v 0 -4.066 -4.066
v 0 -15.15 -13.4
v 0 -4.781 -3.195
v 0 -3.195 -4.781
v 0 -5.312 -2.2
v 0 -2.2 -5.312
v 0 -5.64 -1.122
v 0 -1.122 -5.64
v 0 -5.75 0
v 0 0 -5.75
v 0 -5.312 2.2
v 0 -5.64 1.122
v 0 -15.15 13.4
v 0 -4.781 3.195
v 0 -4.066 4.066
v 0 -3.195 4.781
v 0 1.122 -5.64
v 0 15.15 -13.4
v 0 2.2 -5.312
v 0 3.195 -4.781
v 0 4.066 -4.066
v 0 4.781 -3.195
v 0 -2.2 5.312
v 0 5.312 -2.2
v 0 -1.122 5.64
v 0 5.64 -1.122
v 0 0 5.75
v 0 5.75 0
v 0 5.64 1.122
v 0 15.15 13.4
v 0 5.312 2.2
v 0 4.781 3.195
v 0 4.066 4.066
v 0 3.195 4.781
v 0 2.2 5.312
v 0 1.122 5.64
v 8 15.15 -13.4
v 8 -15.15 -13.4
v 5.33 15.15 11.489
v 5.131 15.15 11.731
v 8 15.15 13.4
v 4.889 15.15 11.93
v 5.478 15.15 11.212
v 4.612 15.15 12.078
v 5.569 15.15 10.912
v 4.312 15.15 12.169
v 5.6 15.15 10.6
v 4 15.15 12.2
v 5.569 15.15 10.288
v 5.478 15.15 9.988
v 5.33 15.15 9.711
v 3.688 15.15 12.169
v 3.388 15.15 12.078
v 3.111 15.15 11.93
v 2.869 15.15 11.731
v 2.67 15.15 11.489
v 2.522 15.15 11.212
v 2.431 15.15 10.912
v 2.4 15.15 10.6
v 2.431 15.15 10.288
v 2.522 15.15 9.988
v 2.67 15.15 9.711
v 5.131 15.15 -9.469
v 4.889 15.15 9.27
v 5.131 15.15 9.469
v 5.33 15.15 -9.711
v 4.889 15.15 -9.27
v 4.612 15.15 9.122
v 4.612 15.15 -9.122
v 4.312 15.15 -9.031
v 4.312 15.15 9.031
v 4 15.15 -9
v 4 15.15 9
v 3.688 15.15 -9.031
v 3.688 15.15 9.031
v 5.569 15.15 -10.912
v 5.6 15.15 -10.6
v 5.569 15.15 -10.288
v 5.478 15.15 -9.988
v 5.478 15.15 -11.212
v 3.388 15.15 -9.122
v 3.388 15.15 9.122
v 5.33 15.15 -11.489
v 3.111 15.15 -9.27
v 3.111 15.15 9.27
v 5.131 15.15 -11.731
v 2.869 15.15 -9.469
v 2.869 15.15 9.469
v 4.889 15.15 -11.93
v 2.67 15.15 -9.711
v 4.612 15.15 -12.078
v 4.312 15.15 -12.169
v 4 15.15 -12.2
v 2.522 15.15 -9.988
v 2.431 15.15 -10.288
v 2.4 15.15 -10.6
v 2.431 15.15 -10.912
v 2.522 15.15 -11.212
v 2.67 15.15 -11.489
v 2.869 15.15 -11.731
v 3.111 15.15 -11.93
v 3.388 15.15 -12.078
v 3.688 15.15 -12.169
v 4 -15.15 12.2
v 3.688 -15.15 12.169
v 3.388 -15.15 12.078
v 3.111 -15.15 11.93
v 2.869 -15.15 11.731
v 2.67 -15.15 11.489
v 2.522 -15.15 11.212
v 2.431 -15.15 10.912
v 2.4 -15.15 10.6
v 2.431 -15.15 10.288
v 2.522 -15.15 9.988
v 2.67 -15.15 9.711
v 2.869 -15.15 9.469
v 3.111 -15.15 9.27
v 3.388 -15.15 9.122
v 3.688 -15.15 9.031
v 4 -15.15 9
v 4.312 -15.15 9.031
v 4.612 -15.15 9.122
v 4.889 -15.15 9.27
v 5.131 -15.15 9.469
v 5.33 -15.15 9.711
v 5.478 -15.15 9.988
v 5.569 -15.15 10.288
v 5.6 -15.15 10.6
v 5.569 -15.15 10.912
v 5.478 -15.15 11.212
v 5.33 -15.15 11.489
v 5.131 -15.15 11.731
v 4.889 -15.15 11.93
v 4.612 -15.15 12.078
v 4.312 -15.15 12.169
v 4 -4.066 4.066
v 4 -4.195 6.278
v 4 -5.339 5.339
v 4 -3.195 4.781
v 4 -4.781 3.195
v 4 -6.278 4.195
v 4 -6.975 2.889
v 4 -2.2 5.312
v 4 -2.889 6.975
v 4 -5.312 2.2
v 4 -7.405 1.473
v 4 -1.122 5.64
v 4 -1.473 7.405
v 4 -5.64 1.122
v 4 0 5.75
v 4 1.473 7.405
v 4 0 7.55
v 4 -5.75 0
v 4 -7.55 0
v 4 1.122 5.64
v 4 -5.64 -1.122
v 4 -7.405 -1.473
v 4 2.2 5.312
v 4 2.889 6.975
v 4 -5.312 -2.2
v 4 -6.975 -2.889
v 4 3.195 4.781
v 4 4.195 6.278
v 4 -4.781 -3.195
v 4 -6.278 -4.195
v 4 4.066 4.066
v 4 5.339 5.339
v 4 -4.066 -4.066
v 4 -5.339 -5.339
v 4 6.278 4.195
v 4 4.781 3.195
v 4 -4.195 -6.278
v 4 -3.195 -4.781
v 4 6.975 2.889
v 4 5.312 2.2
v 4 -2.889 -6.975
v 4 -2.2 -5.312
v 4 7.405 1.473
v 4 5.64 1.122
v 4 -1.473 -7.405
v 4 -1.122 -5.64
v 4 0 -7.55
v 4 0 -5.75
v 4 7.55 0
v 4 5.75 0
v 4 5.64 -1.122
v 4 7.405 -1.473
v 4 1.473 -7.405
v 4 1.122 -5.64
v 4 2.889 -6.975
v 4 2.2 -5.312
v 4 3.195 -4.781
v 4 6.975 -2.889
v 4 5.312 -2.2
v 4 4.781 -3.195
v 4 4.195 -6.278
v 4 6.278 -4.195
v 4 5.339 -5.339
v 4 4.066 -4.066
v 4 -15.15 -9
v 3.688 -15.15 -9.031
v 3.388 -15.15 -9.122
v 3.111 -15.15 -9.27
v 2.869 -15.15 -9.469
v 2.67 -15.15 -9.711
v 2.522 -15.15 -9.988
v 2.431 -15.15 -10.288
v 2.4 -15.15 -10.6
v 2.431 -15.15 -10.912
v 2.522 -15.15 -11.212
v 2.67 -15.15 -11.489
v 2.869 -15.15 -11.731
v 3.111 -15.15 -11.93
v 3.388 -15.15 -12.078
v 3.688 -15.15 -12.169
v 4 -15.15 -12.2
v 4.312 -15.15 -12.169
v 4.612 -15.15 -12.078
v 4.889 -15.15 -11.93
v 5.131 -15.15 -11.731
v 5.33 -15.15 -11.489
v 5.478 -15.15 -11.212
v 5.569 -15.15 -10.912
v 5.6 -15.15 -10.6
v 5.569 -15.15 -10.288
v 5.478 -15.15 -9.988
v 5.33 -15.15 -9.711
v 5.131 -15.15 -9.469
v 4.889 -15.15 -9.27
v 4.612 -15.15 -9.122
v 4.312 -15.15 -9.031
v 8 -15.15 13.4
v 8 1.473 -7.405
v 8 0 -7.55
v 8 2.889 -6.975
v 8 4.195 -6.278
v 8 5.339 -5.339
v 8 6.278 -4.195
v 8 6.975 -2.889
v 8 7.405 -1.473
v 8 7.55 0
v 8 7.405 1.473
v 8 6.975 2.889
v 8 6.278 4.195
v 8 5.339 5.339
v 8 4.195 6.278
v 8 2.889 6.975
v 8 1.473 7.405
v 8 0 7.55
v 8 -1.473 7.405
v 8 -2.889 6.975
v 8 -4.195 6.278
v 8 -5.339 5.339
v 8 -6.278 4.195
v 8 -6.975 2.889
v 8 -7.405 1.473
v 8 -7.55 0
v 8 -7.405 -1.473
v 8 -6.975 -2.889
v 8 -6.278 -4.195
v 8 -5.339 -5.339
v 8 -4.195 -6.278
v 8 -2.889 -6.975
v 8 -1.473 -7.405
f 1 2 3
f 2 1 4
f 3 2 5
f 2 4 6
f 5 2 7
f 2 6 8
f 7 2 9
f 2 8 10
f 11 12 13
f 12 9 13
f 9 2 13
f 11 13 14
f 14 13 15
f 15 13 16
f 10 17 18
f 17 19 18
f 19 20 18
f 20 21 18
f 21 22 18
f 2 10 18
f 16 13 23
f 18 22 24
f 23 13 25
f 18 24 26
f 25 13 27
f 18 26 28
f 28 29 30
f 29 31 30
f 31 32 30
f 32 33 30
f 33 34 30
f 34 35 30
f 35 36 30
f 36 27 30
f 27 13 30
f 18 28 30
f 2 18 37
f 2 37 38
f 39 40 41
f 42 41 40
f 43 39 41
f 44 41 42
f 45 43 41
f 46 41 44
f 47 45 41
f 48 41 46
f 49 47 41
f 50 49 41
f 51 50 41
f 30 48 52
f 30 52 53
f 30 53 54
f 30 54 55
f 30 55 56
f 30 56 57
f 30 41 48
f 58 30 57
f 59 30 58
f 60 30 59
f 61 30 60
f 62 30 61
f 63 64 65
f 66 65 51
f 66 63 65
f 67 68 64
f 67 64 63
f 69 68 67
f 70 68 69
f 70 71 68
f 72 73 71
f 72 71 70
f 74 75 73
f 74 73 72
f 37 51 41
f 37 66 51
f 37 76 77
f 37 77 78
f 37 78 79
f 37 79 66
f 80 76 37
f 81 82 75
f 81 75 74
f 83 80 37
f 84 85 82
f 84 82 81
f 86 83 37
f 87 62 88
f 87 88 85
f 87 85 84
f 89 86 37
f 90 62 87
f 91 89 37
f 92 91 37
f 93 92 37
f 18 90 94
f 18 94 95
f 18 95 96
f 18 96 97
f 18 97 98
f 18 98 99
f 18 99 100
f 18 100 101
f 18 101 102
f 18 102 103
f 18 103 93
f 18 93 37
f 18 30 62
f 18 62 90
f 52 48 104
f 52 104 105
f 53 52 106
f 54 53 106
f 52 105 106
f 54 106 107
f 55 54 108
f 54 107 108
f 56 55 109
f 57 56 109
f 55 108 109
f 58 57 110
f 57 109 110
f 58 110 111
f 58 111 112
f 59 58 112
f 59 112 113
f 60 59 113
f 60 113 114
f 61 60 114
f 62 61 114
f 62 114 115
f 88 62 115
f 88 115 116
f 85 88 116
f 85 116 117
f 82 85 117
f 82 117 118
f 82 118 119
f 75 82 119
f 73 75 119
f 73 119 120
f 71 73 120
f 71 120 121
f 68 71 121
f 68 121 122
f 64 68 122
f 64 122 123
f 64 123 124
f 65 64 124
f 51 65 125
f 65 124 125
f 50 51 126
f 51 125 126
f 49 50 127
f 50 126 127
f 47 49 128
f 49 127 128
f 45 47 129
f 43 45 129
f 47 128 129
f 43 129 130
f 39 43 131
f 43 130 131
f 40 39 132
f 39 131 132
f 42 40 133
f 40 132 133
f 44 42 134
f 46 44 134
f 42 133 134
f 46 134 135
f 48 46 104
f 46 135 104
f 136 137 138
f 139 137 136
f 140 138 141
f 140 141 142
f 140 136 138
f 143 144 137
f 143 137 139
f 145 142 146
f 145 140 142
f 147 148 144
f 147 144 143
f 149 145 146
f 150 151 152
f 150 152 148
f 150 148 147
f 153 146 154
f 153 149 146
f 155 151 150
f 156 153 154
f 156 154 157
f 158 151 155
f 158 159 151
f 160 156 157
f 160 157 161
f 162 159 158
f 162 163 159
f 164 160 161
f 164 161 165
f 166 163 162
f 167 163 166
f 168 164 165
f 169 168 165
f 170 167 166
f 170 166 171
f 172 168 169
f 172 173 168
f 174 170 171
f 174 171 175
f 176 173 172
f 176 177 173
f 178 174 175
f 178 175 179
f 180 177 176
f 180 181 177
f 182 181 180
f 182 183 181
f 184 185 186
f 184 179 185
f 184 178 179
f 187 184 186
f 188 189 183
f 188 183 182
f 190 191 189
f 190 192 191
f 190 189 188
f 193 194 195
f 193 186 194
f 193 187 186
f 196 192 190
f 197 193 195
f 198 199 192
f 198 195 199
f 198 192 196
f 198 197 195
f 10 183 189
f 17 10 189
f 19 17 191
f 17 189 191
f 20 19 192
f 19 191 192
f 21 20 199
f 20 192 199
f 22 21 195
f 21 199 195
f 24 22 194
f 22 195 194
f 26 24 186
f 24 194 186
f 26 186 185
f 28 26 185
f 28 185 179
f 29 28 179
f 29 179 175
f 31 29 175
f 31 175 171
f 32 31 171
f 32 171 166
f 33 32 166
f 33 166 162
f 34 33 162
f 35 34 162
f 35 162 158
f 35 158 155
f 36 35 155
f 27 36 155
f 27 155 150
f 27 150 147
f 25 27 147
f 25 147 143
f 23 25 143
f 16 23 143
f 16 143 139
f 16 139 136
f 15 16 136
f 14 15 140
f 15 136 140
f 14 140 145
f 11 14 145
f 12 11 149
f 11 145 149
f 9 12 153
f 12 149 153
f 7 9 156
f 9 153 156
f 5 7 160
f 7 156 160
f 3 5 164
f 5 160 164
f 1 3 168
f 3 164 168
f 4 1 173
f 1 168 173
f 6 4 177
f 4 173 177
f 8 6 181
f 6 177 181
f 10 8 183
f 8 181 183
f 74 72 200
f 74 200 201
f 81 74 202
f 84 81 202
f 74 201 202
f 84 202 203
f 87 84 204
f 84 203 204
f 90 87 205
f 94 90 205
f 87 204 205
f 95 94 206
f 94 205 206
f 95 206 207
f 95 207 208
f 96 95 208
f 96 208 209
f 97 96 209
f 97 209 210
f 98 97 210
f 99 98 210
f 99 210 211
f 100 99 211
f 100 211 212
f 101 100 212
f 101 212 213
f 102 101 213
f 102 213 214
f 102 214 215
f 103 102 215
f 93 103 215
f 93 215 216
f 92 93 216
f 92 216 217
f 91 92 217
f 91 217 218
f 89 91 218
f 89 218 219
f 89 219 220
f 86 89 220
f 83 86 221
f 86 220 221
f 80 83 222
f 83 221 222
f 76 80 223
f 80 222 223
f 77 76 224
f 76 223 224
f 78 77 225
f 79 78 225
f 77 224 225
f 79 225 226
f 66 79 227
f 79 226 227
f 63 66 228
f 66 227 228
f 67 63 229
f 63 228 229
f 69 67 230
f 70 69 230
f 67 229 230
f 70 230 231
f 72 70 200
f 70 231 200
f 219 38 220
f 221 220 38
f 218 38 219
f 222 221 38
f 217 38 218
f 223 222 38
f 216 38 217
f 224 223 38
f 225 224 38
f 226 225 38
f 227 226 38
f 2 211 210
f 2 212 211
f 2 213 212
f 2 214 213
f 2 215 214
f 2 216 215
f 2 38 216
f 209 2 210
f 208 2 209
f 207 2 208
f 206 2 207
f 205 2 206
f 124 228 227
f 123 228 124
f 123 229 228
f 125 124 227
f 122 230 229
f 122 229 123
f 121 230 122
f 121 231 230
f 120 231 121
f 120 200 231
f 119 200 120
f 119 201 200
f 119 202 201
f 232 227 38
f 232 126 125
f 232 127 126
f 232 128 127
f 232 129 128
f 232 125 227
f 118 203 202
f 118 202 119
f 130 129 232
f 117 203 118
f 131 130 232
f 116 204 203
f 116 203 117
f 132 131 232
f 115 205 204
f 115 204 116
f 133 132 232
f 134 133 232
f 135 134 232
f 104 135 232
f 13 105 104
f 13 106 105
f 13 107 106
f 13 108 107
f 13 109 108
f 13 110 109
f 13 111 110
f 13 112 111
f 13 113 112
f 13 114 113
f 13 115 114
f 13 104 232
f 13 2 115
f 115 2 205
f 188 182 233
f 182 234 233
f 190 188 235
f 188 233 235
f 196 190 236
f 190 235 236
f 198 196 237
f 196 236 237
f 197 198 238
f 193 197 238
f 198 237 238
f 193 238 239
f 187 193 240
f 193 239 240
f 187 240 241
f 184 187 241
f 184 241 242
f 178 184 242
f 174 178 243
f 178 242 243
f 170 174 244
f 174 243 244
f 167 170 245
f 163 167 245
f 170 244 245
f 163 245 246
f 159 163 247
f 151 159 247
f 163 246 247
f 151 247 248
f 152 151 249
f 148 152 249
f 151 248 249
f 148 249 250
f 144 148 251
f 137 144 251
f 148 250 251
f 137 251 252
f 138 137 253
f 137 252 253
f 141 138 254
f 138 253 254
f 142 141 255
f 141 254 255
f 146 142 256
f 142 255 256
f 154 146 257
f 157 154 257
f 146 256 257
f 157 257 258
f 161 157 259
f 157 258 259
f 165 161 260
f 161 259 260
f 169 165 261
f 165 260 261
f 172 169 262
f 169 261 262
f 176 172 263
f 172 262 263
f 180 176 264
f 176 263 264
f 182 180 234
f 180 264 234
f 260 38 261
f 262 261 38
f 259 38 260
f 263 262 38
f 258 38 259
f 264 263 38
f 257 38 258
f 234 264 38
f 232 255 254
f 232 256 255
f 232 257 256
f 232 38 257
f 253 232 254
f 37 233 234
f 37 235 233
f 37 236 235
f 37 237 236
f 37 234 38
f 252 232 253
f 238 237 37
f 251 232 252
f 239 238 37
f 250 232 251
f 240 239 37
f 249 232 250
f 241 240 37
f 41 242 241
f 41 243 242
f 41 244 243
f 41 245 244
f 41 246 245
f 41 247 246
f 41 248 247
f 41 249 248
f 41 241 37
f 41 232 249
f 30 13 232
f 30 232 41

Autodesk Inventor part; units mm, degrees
ref_plane "YZ Plane" through (0, 0, 0) normal (1, 0, 0) x (0, 1, 0)
ref_plane "XZ Plane" through (0, 0, 0) normal (0, 1, 0) x (-1, 0, 0)
ref_plane "XY Plane" through (0, 0, 0) normal (0, 0, 1) x (1, 0, 0)
sketch "Эскиз1" plane through (0, 0, 0) normal (1, 0, 0) x (0, 1, 0)
  line L0 (-15.15, 13.4) -> (15.15, 13.4)
  line L1 (15.15, 13.4) -> (15.15, -13.4)
  line L2 (15.15, -13.4) -> (-15.15, -13.4)
  line L3 (-15.15, -13.4) -> (-15.15, 13.4)
  line L4 (-15.15, 13.4) -> (15.15, -13.4) construction
  line L5 (15.15, 13.4) -> (-15.15, -13.4) construction
  point P0 (0, 0)
  dimension "d0" = 30.3
  dimension "d1" = 26.8
extrude "Выдавливание1" add sketch "Эскиз1" along normal blind 8
sketch "Эскиз2" plane through (0, 15.15, 13.4) normal (0, 1, 0) x (1, 0, 0)
  line L0 (4, 2.8) -> (4, 24)
  line L1 (0, 13.4) -> (8, 13.4)
  line L2 (0, 26.8) -> (0, 0) projected
  line L3 (8, 26.8) -> (8, 0) projected
  point P0 (0, 13.4)
  point P1 (4, 13.4)
  dimension "d4" = 21.2
hole "Отверстие1" at (4, 15.15, 10.6) at (4, 15.15, -10.6) direction (0, -1, 0) diameter 3.2 end through all
sketch "Эскиз3" plane through (8, 0, 0) normal (1, 0, 0) x (0, 0, -1)
  line L0 (13.4, 15.15) -> (-13.4, 15.15) projected
  line L1 (-13.4, -15.15) -> (13.4, -15.15) projected
  line L2 (-13.4, 15.15) -> (13.4, -15.15)
  circle A0 centre (0, 0) radius 5.75
  dimension "d12" = 11.5
extrude "Выдавливание2" cut sketch "Эскиз3" against normal through all
sketch "Эскиз4" plane through (8, 0, 0) normal (1, 0, 0) x (0, 0, -1)
  circle A0 centre (0, 0) radius 5.75 projected
  circle A1 centre (0, 0) radius 7.55
  dimension "d15" = 15.1
extrude "Выдавливание3" cut sketch "Эскиз4" against normal blind 4 contours A0 | A1
properties part number "Differential mount"
